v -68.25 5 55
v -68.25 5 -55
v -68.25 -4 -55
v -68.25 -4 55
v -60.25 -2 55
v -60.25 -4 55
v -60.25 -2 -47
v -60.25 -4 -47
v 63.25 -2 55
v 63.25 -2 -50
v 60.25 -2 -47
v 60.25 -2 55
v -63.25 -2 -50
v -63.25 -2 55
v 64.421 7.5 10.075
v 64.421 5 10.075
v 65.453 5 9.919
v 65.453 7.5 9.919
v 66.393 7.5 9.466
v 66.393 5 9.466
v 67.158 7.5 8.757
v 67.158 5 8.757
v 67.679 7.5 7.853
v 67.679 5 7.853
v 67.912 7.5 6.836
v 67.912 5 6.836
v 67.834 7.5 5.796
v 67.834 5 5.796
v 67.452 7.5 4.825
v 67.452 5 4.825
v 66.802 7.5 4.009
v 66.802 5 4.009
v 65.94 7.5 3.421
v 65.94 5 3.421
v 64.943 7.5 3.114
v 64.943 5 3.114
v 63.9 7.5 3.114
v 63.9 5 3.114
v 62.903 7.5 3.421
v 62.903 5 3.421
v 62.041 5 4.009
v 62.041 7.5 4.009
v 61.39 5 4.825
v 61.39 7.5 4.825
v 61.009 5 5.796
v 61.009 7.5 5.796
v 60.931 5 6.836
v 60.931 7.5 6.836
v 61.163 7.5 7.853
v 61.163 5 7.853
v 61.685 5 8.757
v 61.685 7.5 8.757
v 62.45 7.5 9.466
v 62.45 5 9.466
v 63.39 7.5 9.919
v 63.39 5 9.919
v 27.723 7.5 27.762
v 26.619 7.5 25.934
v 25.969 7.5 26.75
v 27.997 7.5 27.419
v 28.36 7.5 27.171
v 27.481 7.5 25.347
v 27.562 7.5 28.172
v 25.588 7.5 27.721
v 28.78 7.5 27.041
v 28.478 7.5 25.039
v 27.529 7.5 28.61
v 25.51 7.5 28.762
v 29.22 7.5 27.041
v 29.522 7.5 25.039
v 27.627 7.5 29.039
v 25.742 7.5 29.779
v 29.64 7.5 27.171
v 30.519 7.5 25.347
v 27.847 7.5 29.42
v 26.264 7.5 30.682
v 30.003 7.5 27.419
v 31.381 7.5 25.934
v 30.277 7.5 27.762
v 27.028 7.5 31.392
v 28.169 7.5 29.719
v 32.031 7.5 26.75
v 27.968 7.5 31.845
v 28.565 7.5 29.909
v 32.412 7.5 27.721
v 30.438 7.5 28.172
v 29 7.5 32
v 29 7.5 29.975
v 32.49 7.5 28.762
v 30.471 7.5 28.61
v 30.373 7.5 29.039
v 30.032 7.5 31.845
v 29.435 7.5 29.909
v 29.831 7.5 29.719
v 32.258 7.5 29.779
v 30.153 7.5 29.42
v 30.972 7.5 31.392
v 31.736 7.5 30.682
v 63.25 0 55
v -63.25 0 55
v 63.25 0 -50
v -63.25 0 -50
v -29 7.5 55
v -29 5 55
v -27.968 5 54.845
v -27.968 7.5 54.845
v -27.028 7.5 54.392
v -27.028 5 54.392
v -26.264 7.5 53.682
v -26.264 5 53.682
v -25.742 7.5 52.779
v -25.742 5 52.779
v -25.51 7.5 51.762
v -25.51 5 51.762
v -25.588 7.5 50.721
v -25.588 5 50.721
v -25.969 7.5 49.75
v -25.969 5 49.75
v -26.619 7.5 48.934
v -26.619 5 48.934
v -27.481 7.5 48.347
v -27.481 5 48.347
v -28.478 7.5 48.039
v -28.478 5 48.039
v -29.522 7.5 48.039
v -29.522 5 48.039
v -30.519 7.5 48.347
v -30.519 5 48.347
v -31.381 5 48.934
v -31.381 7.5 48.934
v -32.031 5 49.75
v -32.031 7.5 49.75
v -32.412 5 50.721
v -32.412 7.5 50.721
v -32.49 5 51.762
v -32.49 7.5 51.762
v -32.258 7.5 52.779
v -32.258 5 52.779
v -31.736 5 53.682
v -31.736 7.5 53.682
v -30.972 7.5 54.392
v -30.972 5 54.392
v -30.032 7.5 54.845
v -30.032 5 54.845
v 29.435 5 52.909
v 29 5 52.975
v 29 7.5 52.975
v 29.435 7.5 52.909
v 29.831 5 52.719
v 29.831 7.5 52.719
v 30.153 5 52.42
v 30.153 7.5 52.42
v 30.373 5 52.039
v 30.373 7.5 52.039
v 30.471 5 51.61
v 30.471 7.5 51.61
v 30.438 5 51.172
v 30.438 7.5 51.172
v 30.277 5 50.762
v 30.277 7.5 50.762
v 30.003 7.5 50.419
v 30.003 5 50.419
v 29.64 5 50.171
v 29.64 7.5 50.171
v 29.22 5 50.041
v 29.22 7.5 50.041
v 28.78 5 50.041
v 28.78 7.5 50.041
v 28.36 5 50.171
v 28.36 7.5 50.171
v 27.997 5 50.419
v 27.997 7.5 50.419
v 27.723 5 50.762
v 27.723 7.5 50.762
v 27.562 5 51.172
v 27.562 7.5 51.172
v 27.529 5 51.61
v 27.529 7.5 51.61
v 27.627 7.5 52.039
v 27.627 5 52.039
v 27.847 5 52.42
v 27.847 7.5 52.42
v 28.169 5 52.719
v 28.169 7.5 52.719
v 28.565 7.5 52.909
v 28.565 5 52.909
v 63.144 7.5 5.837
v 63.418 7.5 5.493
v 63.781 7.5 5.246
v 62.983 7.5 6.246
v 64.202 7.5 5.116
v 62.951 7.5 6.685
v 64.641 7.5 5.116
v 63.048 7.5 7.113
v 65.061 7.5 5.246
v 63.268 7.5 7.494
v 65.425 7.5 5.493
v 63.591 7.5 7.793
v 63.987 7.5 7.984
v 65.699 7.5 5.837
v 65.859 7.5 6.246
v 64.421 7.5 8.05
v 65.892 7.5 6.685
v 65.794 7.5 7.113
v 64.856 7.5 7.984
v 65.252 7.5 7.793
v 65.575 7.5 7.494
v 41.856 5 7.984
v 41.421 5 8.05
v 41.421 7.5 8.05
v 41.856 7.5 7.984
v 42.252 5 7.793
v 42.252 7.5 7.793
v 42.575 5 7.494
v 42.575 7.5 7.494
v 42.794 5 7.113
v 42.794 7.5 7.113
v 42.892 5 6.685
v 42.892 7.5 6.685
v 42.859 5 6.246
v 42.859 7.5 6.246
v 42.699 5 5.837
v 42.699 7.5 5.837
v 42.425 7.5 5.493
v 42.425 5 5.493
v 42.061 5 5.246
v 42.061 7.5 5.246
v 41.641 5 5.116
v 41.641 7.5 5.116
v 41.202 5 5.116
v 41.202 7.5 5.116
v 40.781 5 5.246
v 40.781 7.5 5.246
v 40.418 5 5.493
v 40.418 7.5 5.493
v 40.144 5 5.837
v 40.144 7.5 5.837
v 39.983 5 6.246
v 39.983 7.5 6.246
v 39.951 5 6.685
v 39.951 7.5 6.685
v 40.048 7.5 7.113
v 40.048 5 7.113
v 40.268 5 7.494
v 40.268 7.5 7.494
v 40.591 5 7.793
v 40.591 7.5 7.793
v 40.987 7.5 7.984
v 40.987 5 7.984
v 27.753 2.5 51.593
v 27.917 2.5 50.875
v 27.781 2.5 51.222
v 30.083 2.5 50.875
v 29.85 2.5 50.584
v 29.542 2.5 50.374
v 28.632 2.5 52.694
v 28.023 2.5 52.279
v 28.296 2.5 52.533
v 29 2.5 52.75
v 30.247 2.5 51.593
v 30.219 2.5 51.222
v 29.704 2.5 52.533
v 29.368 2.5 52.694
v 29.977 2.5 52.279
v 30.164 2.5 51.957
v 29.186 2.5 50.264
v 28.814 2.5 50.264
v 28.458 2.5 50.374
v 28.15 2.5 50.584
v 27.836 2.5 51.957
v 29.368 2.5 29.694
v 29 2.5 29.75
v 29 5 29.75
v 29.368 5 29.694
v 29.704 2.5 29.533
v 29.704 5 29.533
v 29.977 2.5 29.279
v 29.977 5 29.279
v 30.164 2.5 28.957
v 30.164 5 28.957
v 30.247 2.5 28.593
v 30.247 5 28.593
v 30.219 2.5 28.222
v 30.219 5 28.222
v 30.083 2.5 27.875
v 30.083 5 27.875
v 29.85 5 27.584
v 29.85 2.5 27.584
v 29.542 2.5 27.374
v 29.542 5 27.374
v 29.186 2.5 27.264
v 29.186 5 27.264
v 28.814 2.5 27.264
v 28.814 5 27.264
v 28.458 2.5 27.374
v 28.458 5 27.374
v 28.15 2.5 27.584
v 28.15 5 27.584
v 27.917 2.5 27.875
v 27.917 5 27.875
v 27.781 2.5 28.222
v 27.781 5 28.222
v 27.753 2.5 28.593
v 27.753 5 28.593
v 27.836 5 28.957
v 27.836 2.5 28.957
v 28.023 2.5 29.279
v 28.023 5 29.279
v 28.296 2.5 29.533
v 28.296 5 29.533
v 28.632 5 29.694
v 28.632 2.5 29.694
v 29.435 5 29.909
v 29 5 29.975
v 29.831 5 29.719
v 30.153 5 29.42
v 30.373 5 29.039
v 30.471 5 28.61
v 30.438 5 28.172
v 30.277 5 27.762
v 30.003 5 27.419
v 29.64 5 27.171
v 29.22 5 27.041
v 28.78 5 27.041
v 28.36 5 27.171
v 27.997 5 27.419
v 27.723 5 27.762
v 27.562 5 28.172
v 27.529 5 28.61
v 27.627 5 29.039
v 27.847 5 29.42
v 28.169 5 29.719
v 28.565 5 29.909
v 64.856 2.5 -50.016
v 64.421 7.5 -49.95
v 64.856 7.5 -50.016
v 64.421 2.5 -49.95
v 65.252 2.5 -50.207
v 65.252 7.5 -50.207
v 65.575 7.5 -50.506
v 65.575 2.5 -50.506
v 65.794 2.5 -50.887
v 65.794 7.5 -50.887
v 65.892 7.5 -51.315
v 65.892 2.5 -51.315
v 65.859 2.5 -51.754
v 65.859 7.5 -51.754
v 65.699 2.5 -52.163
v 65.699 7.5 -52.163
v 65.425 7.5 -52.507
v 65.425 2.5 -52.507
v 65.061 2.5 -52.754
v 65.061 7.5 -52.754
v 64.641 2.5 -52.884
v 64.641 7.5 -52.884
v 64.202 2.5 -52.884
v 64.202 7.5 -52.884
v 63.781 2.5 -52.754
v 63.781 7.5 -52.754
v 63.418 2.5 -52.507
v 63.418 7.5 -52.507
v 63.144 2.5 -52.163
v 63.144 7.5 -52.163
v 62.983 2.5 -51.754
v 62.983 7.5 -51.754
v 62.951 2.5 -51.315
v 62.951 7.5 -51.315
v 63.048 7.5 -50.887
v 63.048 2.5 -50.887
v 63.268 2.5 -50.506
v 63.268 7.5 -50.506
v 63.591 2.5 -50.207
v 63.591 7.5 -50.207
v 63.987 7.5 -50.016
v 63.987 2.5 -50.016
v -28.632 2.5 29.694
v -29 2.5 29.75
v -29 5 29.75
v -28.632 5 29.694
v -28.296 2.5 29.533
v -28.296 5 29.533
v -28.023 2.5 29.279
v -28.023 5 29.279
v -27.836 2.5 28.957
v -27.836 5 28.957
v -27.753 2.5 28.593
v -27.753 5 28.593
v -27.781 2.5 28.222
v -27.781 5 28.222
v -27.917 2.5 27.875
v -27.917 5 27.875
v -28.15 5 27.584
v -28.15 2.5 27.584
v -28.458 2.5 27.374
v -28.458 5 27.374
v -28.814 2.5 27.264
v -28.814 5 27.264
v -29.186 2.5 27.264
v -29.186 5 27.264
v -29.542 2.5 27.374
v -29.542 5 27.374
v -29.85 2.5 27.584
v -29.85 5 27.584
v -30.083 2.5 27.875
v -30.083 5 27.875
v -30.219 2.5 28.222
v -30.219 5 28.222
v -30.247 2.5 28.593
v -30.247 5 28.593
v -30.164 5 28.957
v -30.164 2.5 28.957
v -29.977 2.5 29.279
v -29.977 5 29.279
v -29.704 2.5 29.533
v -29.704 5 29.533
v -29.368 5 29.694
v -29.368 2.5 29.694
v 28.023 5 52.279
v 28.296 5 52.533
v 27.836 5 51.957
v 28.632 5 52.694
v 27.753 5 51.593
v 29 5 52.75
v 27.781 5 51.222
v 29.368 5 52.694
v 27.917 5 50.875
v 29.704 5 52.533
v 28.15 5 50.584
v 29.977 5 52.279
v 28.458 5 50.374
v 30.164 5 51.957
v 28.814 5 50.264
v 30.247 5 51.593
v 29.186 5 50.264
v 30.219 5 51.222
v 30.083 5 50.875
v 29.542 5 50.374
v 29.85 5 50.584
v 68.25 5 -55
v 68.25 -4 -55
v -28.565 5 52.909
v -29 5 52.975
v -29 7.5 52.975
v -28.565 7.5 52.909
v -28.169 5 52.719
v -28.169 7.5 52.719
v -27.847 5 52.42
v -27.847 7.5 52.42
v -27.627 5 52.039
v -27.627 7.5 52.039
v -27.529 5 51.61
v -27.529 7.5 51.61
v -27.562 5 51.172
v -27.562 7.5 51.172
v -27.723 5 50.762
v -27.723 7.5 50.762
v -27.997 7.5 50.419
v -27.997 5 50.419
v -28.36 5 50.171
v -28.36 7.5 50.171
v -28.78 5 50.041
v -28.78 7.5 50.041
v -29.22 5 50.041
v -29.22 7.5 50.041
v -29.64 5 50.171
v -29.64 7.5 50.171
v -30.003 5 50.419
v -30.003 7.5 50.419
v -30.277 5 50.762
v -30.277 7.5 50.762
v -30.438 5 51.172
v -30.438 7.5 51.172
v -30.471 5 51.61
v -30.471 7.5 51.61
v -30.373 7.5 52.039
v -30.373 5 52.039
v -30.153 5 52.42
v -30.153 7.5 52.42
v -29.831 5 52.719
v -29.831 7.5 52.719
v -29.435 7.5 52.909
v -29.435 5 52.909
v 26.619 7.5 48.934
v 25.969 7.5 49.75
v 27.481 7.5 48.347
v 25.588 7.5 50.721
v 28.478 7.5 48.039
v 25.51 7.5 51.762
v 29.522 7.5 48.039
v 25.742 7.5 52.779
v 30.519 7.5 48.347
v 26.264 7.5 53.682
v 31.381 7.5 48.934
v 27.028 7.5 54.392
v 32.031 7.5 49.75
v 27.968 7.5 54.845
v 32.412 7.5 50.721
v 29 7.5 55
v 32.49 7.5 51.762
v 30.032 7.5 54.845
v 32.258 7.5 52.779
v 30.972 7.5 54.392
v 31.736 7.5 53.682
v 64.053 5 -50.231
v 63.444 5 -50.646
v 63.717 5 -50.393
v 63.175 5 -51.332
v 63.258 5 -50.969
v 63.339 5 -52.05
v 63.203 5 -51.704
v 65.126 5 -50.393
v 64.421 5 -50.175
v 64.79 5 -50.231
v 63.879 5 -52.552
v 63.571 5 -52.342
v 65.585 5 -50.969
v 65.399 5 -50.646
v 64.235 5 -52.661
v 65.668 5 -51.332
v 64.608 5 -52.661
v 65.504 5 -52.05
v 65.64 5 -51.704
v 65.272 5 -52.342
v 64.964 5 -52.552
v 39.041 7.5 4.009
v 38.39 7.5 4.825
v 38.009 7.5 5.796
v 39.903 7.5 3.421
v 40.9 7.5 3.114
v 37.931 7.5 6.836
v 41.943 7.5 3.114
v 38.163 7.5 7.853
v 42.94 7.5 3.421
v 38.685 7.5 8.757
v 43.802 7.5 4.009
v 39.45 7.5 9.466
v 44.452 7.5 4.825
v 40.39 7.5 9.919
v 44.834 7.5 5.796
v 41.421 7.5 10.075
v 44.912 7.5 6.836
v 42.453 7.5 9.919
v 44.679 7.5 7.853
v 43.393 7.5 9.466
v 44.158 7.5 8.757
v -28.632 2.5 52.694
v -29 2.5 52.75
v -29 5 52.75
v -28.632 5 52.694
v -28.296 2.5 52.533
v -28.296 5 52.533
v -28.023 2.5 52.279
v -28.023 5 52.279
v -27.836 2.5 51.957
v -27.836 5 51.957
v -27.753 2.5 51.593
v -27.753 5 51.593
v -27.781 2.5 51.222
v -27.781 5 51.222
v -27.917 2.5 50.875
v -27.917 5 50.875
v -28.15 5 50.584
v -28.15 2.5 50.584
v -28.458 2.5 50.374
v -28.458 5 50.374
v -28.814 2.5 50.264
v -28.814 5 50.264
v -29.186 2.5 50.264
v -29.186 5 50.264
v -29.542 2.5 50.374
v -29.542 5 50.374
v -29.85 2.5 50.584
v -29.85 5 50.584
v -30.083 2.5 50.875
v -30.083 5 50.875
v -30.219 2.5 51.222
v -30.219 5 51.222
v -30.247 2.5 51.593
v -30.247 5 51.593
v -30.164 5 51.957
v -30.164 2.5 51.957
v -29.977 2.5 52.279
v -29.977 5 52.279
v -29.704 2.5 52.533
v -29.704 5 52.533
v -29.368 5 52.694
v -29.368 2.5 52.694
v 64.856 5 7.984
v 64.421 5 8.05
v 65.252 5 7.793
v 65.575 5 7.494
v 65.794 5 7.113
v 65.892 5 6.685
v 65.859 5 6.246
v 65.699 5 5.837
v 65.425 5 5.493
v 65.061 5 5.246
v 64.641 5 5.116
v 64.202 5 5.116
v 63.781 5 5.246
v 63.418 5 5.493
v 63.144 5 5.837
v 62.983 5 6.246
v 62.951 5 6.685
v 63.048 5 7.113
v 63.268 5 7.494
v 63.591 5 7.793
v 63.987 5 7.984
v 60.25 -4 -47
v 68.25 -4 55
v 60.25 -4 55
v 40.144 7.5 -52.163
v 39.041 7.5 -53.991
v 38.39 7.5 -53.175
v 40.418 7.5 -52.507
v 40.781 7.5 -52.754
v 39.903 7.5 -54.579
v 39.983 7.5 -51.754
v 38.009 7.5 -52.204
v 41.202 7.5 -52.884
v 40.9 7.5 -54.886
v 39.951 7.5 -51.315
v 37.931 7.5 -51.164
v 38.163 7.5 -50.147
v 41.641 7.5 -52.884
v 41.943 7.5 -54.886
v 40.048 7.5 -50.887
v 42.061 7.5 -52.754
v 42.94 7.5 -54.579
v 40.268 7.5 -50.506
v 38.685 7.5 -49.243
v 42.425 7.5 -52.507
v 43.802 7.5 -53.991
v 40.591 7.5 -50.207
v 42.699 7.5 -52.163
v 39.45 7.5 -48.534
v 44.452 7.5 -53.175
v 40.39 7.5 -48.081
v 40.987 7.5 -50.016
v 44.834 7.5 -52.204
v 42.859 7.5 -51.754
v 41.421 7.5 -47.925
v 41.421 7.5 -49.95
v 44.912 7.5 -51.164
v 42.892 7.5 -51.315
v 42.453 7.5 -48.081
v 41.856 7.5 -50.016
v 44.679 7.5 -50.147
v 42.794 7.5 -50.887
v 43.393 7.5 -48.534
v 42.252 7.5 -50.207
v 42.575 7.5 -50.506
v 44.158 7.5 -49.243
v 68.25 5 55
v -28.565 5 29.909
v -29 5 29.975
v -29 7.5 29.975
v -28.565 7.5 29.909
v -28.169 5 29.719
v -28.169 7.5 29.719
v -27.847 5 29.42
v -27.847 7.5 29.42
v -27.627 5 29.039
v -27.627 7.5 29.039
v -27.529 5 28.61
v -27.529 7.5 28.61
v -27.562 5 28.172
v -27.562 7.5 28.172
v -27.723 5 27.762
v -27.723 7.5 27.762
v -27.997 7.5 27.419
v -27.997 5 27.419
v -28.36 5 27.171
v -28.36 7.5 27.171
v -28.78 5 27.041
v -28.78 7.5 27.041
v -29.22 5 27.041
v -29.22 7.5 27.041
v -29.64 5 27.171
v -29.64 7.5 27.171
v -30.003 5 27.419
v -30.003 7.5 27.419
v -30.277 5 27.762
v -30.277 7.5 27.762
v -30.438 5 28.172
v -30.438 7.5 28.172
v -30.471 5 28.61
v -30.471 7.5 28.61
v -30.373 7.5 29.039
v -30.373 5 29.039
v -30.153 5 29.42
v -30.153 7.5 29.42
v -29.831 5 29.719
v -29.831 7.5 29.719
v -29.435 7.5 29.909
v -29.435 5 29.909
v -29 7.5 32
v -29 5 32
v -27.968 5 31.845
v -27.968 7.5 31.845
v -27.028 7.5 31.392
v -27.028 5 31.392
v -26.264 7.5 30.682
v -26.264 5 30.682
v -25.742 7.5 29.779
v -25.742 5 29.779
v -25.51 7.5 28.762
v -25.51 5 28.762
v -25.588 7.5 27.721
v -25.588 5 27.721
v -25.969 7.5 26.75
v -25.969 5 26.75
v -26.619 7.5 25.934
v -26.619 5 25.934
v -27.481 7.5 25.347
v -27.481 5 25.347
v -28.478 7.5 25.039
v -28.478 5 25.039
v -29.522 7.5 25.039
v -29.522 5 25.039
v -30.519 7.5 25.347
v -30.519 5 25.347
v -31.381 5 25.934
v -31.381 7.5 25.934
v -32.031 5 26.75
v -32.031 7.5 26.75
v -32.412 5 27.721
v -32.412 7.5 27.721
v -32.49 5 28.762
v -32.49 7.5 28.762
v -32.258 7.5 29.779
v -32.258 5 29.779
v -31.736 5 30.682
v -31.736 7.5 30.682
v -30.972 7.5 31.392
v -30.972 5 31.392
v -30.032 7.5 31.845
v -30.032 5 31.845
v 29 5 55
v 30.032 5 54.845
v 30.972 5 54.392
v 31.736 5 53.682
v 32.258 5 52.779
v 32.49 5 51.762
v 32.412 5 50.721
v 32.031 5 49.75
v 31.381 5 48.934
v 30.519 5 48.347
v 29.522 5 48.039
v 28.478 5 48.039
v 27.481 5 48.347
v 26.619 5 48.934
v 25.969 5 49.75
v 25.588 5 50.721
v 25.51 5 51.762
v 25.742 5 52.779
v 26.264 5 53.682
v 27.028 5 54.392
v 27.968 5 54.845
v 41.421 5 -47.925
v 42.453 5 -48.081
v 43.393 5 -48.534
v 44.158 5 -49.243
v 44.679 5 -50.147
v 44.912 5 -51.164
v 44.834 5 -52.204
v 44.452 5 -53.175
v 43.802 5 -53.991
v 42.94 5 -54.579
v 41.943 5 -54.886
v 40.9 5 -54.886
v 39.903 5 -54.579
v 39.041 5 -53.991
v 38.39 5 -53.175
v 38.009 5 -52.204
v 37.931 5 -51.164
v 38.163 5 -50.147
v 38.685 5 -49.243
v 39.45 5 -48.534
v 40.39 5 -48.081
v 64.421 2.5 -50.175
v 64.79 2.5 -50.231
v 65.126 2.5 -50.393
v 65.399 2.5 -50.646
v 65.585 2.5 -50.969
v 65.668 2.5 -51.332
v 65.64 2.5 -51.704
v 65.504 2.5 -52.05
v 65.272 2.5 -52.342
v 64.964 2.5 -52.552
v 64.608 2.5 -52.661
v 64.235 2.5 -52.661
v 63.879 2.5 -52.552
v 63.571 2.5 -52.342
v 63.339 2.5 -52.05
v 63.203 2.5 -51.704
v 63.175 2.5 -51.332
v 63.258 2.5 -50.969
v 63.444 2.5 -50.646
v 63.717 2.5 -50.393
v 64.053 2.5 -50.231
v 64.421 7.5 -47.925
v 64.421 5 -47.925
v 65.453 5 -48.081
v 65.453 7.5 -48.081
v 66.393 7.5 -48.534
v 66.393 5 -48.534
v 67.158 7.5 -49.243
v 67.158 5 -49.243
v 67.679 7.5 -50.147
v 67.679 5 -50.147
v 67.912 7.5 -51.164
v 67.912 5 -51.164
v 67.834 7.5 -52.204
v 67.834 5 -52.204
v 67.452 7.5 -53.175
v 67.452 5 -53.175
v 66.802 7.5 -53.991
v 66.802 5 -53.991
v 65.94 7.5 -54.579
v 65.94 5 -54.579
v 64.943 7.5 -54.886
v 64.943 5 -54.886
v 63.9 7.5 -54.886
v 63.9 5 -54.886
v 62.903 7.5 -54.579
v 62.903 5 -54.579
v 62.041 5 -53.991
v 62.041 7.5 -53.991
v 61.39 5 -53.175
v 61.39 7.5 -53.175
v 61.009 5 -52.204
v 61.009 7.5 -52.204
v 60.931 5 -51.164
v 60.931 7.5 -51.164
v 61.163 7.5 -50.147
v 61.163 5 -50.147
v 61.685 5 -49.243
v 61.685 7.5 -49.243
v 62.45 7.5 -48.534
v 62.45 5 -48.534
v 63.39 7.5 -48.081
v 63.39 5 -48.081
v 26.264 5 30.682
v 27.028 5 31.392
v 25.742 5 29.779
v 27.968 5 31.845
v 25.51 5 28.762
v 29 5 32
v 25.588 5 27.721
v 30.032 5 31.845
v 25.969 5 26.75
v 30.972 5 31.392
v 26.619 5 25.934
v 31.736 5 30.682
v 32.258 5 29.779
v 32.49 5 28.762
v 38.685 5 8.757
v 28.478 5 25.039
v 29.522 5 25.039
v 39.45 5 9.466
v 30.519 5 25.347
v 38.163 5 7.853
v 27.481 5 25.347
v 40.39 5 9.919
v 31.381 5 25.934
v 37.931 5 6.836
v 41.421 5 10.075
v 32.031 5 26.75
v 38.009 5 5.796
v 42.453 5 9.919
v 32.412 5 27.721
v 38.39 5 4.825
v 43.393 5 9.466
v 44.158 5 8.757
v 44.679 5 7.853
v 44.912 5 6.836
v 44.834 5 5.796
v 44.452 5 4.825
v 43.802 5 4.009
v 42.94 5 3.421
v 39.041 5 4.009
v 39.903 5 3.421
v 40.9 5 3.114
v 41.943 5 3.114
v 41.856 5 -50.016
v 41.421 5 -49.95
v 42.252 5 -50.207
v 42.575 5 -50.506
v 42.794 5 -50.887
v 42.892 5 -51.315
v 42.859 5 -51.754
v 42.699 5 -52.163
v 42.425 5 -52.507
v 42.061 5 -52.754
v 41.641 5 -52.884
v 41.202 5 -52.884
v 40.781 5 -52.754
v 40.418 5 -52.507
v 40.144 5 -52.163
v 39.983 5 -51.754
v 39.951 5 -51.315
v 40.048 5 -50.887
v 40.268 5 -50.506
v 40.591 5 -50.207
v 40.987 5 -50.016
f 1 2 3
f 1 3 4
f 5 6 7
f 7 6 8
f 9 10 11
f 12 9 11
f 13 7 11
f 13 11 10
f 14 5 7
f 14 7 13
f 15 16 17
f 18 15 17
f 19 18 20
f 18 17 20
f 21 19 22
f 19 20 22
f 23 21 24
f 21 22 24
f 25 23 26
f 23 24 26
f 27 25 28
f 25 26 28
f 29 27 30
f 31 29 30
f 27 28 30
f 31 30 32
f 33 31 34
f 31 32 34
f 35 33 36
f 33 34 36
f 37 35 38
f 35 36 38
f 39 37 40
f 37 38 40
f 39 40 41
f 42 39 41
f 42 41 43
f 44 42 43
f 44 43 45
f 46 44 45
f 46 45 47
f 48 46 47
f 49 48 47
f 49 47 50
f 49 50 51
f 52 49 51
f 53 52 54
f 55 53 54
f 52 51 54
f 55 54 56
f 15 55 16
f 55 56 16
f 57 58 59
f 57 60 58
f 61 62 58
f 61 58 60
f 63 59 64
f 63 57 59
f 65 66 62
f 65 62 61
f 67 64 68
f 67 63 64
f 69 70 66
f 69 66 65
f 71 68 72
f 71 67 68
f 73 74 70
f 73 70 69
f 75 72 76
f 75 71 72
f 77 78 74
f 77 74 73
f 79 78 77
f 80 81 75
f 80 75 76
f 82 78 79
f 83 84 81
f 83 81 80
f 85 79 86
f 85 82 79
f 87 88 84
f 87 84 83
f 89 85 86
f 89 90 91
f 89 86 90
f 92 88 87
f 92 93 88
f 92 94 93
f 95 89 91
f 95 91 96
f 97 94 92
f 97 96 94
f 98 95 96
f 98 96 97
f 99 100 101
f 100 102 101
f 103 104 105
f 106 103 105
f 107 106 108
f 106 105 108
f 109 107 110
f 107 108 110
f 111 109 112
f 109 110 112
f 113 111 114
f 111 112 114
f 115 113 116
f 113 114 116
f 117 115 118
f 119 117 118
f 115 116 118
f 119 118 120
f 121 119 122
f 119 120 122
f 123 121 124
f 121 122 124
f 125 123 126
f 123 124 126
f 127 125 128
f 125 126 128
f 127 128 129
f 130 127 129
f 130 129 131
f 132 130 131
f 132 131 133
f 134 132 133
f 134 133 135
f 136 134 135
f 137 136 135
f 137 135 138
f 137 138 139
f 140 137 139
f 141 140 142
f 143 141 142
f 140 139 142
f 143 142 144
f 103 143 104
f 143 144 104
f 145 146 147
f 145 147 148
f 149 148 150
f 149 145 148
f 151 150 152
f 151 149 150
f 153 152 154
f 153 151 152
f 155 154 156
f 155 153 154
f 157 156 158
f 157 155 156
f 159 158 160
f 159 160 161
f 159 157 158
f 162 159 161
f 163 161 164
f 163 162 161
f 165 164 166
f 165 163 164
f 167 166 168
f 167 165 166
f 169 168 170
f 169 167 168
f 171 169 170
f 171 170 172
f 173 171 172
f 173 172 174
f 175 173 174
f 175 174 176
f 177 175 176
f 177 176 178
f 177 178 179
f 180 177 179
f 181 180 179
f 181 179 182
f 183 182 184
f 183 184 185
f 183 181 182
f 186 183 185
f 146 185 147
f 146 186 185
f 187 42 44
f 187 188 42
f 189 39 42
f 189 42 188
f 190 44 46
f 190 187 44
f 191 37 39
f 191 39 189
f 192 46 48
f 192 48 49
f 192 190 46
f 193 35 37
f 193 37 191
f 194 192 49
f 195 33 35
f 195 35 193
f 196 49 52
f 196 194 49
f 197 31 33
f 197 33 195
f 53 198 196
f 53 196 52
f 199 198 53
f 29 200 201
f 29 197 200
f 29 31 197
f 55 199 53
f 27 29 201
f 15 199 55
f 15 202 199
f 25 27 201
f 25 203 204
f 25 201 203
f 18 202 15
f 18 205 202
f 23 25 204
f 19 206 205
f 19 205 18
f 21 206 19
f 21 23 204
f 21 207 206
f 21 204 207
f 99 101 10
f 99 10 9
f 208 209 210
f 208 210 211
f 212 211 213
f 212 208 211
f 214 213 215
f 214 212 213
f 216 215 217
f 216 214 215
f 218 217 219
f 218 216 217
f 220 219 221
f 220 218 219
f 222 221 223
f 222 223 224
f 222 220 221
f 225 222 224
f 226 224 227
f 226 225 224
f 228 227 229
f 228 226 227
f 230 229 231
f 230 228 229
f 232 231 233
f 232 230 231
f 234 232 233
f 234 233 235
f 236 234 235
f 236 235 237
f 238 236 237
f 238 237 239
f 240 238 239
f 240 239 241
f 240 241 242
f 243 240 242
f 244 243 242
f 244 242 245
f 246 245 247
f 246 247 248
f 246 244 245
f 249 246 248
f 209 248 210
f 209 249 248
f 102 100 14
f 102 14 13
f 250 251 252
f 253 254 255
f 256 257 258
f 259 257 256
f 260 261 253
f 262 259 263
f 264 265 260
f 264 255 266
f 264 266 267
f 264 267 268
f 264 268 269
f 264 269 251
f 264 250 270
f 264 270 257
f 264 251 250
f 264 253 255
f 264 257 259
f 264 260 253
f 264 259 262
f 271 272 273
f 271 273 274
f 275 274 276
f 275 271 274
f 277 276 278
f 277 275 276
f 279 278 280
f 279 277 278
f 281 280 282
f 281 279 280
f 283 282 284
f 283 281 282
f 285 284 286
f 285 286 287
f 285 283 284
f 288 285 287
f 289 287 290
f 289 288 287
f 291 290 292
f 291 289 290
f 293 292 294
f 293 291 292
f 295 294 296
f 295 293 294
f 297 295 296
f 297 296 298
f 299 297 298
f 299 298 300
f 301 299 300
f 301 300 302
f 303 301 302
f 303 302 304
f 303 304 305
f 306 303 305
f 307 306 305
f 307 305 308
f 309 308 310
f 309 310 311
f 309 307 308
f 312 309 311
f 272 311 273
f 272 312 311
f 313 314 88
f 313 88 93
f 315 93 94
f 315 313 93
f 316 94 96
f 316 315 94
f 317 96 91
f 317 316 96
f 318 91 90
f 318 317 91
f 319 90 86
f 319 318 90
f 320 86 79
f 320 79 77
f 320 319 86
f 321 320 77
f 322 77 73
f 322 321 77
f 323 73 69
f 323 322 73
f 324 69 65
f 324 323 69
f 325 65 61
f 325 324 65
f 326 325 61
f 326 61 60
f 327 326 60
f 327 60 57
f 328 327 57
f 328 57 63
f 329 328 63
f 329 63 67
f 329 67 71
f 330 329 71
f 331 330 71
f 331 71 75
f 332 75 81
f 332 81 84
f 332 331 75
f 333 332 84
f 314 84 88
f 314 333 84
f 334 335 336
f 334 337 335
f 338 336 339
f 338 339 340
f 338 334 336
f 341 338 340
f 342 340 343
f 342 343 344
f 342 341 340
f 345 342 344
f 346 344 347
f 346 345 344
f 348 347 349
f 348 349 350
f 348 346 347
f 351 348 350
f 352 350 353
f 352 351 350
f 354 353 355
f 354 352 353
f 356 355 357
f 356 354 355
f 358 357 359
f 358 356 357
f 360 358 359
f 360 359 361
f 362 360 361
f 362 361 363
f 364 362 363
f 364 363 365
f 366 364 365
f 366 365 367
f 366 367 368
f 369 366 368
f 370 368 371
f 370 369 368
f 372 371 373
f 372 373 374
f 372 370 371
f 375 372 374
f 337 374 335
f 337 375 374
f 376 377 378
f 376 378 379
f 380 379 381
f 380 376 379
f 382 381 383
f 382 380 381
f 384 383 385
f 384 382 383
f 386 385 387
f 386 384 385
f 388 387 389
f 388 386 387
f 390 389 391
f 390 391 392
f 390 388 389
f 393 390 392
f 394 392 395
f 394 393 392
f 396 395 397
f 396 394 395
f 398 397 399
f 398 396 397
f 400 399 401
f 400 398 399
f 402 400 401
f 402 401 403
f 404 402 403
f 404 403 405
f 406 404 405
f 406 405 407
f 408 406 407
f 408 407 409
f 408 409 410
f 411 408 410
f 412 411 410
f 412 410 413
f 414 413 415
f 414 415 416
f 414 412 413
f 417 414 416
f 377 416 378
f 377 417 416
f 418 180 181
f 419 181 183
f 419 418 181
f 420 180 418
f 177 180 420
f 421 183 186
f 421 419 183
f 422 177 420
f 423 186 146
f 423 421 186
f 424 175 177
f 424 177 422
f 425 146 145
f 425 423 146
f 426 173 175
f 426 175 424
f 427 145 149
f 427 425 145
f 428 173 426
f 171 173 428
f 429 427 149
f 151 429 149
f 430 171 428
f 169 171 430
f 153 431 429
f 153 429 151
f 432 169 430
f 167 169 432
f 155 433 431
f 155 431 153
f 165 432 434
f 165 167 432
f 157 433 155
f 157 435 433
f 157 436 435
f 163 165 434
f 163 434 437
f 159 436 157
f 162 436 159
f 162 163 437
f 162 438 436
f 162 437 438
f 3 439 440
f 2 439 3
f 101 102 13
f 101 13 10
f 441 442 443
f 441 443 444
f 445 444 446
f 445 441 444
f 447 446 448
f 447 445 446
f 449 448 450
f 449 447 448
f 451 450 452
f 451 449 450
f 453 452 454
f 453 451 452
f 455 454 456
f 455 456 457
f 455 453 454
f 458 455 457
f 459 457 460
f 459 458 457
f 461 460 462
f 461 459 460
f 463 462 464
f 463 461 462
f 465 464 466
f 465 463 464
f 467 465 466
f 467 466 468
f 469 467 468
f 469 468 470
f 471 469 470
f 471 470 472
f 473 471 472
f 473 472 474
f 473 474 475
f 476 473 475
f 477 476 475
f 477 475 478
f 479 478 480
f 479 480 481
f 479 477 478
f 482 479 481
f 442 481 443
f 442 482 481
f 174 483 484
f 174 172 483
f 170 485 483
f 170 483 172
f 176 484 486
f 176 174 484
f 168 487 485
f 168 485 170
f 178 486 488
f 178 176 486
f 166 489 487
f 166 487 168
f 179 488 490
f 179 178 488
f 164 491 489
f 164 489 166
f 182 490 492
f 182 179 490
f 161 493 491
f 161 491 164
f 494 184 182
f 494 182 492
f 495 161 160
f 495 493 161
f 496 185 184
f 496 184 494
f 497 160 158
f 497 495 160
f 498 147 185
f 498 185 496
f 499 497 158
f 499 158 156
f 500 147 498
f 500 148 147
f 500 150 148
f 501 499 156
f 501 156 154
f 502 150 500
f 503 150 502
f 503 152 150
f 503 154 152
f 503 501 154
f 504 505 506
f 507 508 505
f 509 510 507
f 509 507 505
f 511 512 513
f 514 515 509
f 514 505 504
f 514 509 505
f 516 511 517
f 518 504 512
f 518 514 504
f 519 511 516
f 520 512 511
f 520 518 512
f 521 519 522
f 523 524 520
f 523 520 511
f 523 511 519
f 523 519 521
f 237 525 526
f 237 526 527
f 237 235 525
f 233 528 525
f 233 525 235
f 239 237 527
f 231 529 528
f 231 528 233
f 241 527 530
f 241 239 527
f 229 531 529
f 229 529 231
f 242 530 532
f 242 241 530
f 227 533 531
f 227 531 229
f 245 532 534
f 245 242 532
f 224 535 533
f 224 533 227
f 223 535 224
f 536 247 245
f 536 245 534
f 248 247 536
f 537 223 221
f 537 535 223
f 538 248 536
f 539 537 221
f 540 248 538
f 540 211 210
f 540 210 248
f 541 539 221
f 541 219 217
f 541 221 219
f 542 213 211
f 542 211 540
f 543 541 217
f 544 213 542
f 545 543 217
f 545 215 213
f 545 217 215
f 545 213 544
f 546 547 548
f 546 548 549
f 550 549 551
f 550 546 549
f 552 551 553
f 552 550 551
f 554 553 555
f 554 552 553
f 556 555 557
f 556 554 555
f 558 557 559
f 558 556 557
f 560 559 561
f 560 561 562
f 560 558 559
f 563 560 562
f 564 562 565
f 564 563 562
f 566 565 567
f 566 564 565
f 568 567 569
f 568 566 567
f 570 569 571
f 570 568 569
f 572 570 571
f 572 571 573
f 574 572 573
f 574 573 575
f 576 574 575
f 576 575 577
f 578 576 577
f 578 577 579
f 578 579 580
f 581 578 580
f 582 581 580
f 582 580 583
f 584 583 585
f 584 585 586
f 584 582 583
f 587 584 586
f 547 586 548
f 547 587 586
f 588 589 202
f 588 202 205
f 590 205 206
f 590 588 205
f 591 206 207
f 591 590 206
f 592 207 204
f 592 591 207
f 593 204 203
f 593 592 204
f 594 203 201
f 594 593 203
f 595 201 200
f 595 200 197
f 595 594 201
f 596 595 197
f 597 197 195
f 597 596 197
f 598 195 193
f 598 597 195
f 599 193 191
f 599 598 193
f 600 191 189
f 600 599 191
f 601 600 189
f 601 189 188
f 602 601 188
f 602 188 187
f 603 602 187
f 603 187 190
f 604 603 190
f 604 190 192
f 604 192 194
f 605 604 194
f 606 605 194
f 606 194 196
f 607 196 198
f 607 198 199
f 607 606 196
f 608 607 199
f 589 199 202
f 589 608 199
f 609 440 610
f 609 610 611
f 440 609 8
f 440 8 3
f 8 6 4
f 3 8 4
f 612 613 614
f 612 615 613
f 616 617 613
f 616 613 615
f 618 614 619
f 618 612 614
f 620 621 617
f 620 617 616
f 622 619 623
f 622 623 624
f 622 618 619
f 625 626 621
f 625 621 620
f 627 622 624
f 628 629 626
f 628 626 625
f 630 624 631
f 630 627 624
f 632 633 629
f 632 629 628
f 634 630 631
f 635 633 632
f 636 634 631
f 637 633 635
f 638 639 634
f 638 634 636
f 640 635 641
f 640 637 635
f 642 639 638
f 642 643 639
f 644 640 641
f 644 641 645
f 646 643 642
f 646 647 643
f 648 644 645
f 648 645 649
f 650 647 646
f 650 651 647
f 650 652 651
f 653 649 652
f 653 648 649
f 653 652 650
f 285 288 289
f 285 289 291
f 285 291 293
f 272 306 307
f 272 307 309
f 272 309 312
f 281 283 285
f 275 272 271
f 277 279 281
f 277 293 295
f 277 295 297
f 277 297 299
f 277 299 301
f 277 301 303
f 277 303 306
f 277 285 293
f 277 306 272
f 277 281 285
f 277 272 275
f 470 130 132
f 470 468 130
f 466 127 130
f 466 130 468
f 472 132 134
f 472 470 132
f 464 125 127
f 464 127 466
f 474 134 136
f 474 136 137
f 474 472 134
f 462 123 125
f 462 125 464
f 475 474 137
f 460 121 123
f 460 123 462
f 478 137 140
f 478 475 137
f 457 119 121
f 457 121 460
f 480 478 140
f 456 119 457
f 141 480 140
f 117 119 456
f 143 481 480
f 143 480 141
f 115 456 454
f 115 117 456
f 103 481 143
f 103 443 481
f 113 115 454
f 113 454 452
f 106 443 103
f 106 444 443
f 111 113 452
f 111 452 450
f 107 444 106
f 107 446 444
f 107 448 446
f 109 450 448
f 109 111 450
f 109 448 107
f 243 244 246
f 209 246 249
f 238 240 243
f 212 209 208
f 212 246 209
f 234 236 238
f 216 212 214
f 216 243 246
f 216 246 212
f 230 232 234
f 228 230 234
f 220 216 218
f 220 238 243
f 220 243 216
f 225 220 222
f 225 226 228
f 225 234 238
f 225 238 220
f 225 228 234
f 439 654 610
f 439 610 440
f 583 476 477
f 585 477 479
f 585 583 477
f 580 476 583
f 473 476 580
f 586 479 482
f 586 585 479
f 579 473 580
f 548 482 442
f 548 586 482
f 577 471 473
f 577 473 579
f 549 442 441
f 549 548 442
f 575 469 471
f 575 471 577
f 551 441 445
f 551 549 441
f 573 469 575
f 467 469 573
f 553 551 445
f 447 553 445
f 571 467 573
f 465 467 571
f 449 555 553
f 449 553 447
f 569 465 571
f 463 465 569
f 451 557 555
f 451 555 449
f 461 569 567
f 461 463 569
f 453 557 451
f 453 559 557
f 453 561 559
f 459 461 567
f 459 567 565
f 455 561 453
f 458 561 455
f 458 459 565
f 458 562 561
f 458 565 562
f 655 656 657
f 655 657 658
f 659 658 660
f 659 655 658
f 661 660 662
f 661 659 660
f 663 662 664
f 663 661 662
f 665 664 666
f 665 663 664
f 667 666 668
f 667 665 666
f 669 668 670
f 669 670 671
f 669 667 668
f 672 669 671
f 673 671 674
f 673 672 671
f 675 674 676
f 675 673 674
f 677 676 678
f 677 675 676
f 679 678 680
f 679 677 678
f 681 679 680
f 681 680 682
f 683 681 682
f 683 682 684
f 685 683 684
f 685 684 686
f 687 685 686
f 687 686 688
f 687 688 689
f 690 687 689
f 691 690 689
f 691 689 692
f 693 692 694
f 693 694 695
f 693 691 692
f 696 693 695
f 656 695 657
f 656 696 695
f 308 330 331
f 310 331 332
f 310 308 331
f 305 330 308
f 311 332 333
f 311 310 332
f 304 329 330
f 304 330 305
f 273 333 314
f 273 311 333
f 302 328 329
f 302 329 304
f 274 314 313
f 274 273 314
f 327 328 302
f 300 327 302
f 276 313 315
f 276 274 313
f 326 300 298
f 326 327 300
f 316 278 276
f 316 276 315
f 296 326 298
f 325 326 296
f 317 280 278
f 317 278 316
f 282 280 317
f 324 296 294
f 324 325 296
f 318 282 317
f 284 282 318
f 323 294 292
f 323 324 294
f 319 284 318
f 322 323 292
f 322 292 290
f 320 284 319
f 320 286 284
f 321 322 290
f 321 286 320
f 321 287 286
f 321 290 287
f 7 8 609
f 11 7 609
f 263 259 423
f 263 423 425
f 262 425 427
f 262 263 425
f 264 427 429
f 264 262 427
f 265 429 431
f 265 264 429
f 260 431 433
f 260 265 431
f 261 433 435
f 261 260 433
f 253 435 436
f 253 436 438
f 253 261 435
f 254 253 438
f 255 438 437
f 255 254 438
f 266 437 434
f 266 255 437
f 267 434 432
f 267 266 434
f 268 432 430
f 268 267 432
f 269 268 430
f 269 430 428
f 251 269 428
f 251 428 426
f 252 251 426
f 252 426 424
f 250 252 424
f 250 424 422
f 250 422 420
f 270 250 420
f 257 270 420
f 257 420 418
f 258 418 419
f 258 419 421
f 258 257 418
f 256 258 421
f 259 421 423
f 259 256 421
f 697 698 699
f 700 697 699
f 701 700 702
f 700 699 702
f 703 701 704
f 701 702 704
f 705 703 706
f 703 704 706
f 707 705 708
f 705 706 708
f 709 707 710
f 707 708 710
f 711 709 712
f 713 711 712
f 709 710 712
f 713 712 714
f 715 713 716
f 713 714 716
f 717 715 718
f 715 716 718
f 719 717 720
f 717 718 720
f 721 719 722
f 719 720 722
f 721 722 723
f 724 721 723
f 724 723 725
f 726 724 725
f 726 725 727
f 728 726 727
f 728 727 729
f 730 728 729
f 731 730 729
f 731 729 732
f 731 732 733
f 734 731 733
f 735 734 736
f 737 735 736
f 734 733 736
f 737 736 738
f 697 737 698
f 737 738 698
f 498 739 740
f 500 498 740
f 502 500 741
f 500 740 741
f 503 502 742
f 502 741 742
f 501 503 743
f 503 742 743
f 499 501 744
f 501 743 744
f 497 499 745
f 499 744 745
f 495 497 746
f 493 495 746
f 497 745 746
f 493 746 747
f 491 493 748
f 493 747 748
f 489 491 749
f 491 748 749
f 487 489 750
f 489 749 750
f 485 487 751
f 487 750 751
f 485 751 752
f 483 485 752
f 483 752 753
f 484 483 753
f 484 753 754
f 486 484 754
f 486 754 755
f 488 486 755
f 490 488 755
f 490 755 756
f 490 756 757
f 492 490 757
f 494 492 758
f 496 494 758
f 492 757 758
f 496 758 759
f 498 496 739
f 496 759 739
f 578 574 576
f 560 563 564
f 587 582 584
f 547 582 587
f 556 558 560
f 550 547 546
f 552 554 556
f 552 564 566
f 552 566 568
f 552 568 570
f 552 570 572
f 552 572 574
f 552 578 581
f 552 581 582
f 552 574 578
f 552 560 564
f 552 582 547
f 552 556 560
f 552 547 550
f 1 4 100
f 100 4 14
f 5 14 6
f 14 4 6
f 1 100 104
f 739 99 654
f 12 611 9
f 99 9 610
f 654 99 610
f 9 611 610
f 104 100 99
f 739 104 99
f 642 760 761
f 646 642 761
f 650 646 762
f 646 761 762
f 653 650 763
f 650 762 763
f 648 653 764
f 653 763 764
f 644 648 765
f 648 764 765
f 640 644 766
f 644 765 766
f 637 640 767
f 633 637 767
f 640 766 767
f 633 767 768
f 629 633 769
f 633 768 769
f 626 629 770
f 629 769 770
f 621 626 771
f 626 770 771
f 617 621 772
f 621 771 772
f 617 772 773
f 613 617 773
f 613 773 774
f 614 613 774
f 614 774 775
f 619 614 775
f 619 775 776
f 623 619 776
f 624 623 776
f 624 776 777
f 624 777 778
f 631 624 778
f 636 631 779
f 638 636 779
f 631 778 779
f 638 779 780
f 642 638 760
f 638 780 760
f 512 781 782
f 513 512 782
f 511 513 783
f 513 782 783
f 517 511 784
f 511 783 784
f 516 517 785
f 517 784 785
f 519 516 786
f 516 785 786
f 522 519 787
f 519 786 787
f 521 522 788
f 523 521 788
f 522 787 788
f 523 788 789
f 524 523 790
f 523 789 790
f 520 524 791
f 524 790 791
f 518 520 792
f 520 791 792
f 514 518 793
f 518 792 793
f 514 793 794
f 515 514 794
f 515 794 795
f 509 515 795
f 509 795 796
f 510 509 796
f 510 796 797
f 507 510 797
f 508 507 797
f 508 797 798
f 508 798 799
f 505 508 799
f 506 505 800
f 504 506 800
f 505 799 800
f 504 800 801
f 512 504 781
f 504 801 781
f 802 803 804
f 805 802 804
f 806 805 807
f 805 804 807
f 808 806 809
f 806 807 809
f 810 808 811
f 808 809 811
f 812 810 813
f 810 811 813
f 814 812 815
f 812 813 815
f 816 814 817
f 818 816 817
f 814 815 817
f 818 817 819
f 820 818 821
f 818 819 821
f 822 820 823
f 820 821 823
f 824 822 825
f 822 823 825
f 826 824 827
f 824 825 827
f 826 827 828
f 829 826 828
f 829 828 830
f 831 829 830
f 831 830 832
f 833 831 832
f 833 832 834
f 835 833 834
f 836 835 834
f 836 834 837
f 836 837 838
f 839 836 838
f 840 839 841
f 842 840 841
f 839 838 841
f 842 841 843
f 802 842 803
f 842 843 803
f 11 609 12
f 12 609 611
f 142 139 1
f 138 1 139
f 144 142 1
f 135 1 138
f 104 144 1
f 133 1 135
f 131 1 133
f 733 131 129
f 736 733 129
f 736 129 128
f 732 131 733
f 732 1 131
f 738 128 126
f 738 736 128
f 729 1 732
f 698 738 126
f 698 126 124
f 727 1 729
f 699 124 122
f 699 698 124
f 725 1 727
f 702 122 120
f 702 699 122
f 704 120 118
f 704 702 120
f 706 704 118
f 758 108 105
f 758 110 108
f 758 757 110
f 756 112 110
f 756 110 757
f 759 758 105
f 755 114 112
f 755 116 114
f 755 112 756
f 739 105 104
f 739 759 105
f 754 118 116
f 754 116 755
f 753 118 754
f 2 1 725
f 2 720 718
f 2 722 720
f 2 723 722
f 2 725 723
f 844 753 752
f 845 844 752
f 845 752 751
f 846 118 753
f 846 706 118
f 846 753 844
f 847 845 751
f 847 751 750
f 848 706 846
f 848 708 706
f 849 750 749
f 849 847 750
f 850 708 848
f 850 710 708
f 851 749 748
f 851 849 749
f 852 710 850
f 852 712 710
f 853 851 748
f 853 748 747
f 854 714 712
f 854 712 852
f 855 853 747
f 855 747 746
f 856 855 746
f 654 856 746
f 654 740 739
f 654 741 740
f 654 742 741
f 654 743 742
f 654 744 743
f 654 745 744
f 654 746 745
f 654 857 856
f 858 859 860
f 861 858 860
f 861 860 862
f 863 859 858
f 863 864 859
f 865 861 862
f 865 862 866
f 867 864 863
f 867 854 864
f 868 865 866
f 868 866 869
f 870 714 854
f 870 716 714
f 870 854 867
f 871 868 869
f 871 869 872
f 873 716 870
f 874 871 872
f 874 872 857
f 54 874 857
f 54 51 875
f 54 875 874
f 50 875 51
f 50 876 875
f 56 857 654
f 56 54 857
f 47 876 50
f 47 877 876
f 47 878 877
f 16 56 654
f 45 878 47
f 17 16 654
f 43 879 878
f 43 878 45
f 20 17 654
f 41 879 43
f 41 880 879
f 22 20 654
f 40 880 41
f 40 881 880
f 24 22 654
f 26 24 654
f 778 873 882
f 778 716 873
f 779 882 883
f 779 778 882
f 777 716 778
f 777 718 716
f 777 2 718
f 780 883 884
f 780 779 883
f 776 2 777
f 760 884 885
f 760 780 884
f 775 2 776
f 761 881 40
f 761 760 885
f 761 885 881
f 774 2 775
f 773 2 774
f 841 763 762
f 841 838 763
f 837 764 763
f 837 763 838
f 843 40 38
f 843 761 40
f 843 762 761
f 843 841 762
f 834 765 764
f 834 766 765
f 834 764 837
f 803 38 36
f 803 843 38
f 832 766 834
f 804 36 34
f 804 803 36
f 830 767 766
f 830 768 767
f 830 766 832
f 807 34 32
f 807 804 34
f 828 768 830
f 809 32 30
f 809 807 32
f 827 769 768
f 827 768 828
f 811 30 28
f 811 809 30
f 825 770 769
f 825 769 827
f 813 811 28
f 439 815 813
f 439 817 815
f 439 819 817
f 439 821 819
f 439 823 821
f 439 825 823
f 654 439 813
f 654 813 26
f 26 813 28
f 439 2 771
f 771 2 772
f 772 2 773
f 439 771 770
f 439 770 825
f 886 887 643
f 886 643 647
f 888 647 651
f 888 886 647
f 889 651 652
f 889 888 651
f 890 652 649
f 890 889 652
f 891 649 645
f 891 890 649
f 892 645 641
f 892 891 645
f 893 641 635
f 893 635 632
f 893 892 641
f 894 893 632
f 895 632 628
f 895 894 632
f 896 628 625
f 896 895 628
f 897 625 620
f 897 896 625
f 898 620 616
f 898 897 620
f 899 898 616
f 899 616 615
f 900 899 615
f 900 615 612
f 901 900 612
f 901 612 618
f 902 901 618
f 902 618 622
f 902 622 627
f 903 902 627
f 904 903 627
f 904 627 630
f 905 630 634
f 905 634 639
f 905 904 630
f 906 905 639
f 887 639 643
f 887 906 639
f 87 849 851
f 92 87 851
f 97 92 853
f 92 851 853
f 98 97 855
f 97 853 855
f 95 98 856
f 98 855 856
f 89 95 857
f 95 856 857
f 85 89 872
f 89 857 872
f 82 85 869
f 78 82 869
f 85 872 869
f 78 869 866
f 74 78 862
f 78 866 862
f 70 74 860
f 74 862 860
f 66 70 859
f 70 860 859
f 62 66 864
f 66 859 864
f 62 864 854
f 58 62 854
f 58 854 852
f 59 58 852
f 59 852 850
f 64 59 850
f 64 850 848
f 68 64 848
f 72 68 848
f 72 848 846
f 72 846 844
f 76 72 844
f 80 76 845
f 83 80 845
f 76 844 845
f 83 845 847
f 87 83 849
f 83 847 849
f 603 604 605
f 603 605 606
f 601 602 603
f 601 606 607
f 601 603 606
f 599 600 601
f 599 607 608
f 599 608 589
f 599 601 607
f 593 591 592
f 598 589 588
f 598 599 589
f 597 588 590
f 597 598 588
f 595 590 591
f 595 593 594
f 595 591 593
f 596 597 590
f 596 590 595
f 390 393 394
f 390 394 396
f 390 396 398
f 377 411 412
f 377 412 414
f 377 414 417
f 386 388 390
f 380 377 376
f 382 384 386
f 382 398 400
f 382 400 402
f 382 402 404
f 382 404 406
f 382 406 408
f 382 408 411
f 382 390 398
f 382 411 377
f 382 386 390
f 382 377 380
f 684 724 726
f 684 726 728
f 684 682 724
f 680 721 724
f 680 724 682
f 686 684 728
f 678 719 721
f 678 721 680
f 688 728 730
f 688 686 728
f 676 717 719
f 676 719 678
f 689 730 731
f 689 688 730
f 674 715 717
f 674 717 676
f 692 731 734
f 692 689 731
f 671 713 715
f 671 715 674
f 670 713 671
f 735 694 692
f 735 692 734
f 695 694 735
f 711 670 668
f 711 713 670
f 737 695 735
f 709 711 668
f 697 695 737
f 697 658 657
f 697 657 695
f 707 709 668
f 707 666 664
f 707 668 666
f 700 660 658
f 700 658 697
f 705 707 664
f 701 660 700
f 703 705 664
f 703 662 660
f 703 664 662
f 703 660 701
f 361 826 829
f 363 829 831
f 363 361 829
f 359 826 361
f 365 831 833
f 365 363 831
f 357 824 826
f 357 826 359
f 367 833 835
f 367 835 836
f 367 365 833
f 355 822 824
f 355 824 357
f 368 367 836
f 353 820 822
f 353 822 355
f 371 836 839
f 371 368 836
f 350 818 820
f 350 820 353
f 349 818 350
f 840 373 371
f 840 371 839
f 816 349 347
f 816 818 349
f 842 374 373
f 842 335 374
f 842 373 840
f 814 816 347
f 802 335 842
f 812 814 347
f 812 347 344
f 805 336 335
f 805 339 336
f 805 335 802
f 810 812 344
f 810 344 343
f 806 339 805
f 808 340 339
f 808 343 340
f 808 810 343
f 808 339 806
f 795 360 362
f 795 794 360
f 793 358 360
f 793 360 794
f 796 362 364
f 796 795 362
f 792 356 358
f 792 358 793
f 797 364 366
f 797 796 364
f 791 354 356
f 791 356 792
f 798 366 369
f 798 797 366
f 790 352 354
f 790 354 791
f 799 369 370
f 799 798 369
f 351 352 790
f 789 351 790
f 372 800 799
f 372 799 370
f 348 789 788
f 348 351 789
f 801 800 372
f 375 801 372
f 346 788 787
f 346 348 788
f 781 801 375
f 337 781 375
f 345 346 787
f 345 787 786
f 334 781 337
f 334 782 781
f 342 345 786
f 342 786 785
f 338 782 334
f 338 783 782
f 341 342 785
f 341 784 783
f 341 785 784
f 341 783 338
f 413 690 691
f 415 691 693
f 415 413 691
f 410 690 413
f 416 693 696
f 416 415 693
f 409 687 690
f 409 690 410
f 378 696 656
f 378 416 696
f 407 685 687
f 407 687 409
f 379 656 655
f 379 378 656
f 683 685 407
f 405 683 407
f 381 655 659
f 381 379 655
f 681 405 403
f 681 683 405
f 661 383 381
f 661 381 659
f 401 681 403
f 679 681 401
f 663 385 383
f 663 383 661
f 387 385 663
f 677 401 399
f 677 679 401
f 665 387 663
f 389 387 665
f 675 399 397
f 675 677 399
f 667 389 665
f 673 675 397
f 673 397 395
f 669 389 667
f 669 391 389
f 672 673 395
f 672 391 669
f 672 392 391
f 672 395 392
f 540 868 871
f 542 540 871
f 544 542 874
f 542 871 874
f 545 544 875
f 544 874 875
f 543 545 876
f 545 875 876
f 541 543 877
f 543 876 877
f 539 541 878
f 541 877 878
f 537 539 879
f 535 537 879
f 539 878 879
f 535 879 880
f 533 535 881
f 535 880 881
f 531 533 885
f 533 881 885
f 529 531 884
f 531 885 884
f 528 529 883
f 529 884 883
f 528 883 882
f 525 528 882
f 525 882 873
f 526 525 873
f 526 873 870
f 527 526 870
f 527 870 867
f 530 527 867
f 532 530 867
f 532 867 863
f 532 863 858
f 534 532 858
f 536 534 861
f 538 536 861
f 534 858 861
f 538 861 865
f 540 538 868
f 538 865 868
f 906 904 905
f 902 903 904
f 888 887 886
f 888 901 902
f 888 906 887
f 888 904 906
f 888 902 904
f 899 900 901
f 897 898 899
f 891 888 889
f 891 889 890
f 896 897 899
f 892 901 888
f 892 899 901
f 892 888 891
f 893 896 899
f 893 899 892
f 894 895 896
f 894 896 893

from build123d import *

# Parameters (mm, degrees)
SKETCH1_W           = 136.5
SKETCH1_H           = 110
BOSS_EXTRUDE1_DEPTH = 5
BOSS_EXTRUDE2_DEPTH = 4
BOSS_EXTRUDE3_DEPTH = 2
SKETCH3_R           = 3.5
SKETCH3_R_2         = 1.475
BOSS_EXTRUDE4_DEPTH = 2.5
CUT_EXTRUDE1_START  = -2.5
SKETCH3_6_R         = 1.25
SKETCH3_6_R_2       = 1.475
CUT_EXTRUDE1_DEPTH  = 2.5


with BuildPart() as part:
    # Sketch1 → Boss-Extrude1 (new body)
    with BuildSketch(Plane(origin=(0, 0, 0), x_dir=(1, 0, 0), z_dir=(0, 1, 0))):
        Rectangle(SKETCH1_W, SKETCH1_H)
    extrude(amount=BOSS_EXTRUDE1_DEPTH)

    # Sketch1<4> → Boss-Extrude2 (add)
    with BuildSketch(Plane(origin=(0, 0, 0), x_dir=(1, 0, 0), z_dir=(0, 1, 0))):
        Polygon((63.25, 50), (63.25, -50), (63.25, -55), (68.25, -55), (68.25, 55), (-68.25, 55), (-68.25, -55), (-63.25, -55), (-63.25, -50), (-63.25, 50), align=None)
    extrude(amount=-BOSS_EXTRUDE2_DEPTH)

    # Sketch2 → Boss-Extrude3 (add)
    with BuildSketch(Plane.XZ.offset(4)):
        Polygon((-60.25, 55), (-60.25, -47), (60.25, -47), (60.25, 55), (63.25, 55), (63.25, -50), (-63.25, -50), (-63.25, 55), align=None)
    extrude(amount=-BOSS_EXTRUDE3_DEPTH)

    # Sketch3 → Boss-Extrude4 (add)
    # profile 1 of 8: a face of its own
    with BuildSketch(Plane(origin=(0, 5, 0), x_dir=(1, 0, 0), z_dir=(0, 1, 0))):
        with Locations((29, -51.5)):
            Circle(SKETCH3_R)
        with Locations((29, -51.5)):
            Circle(SKETCH3_R_2, mode=Mode.SUBTRACT)
    # profile 2 of 8: a face of its own
    with BuildSketch(Plane(origin=(0, 5, 0), x_dir=(1, 0, 0), z_dir=(0, 1, 0))):
        with Locations((-29, -51.5)):
            Circle(SKETCH3_R)
        with Locations((-29, -51.5)):
            Circle(SKETCH3_R_2, mode=Mode.SUBTRACT)
    # profile 3 of 8: a face of its own
    with BuildSketch(Plane(origin=(0, 5, 0), x_dir=(1, 0, 0), z_dir=(0, 1, 0))):
        with Locations((29, -28.5)):
            Circle(SKETCH3_R)
        with Locations((29, -28.5)):
            Circle(SKETCH3_R_2, mode=Mode.SUBTRACT)
    # profile 4 of 8: a face of its own
    with BuildSketch(Plane(origin=(0, 5, 0), x_dir=(1, 0, 0), z_dir=(0, 1, 0))):
        with Locations((-29, -28.5)):
            Circle(SKETCH3_R)
        with Locations((-29, -28.5)):
            Circle(SKETCH3_R_2, mode=Mode.SUBTRACT)
    # profile 5 of 8: a face of its own
    with BuildSketch(Plane(origin=(0, 5, 0), x_dir=(1, 0, 0), z_dir=(0, 1, 0))):
        with Locations((64.421406537, 51.425448186)):
            Circle(SKETCH3_R)
        with Locations((64.421406537, 51.425448186)):
            Circle(SKETCH3_R_2, mode=Mode.SUBTRACT)
    # profile 6 of 8: a face of its own
    with BuildSketch(Plane(origin=(0, 5, 0), x_dir=(1, 0, 0), z_dir=(0, 1, 0))):
        with Locations((64.421406537, -6.574551814)):
            Circle(SKETCH3_R)
        with Locations((64.421406537, -6.574551814)):
            Circle(SKETCH3_R_2, mode=Mode.SUBTRACT)
    # profile 7 of 8: a face of its own
    with BuildSketch(Plane(origin=(0, 5, 0), x_dir=(1, 0, 0), z_dir=(0, 1, 0))):
        with Locations((41.421406537, 51.425448186)):
            Circle(SKETCH3_R)
        with Locations((41.421406537, 51.425448186)):
            Circle(SKETCH3_R_2, mode=Mode.SUBTRACT)
    # profile 8 of 8: a face of its own
    with BuildSketch(Plane(origin=(0, 5, 0), x_dir=(1, 0, 0), z_dir=(0, 1, 0))):
        with Locations((41.421406537, -6.574551814)):
            Circle(SKETCH3_R)
        with Locations((41.421406537, -6.574551814)):
            Circle(SKETCH3_R_2, mode=Mode.SUBTRACT)
    extrude(amount=BOSS_EXTRUDE4_DEPTH)

    # Sketch3<6> → Cut-Extrude1 (cut)
    # profile 1 of 5: a face of its own
    with BuildSketch(Plane(origin=(0, 5, 0), x_dir=(1, 0, 0), z_dir=(0, 1, 0)).offset(CUT_EXTRUDE1_START)):
        with Locations((-29, -51.5)):
            Circle(SKETCH3_6_R)
    # profile 2 of 5: a face of its own
    with BuildSketch(Plane(origin=(0, 5, 0), x_dir=(1, 0, 0), z_dir=(0, 1, 0)).offset(CUT_EXTRUDE1_START)):
        with Locations((-29, -28.5)):
            Circle(SKETCH3_6_R)
    # profile 3 of 5: a face of its own
    with BuildSketch(Plane(origin=(0, 5, 0), x_dir=(1, 0, 0), z_dir=(0, 1, 0)).offset(CUT_EXTRUDE1_START)):
        with Locations((29, -28.5)):
            Circle(SKETCH3_6_R)
    # profile 4 of 5: a face of its own
    with BuildSketch(Plane(origin=(0, 5, 0), x_dir=(1, 0, 0), z_dir=(0, 1, 0)).offset(CUT_EXTRUDE1_START)):
        with Locations((29, -51.5)):
            Circle(SKETCH3_6_R)
    # profile 5 of 5: a face of its own
    with BuildSketch(Plane(origin=(0, 5, 0), x_dir=(1, 0, 0), z_dir=(0, 1, 0)).offset(CUT_EXTRUDE1_START)):
        with Locations((64.421406537, 51.425448186)):
            Circle(SKETCH3_6_R_2)
        with Locations((64.421406537, 51.425448186)):
            Circle(SKETCH3_6_R, mode=Mode.SUBTRACT)
    extrude(amount=CUT_EXTRUDE1_DEPTH, mode=Mode.SUBTRACT)


solid = part.part
